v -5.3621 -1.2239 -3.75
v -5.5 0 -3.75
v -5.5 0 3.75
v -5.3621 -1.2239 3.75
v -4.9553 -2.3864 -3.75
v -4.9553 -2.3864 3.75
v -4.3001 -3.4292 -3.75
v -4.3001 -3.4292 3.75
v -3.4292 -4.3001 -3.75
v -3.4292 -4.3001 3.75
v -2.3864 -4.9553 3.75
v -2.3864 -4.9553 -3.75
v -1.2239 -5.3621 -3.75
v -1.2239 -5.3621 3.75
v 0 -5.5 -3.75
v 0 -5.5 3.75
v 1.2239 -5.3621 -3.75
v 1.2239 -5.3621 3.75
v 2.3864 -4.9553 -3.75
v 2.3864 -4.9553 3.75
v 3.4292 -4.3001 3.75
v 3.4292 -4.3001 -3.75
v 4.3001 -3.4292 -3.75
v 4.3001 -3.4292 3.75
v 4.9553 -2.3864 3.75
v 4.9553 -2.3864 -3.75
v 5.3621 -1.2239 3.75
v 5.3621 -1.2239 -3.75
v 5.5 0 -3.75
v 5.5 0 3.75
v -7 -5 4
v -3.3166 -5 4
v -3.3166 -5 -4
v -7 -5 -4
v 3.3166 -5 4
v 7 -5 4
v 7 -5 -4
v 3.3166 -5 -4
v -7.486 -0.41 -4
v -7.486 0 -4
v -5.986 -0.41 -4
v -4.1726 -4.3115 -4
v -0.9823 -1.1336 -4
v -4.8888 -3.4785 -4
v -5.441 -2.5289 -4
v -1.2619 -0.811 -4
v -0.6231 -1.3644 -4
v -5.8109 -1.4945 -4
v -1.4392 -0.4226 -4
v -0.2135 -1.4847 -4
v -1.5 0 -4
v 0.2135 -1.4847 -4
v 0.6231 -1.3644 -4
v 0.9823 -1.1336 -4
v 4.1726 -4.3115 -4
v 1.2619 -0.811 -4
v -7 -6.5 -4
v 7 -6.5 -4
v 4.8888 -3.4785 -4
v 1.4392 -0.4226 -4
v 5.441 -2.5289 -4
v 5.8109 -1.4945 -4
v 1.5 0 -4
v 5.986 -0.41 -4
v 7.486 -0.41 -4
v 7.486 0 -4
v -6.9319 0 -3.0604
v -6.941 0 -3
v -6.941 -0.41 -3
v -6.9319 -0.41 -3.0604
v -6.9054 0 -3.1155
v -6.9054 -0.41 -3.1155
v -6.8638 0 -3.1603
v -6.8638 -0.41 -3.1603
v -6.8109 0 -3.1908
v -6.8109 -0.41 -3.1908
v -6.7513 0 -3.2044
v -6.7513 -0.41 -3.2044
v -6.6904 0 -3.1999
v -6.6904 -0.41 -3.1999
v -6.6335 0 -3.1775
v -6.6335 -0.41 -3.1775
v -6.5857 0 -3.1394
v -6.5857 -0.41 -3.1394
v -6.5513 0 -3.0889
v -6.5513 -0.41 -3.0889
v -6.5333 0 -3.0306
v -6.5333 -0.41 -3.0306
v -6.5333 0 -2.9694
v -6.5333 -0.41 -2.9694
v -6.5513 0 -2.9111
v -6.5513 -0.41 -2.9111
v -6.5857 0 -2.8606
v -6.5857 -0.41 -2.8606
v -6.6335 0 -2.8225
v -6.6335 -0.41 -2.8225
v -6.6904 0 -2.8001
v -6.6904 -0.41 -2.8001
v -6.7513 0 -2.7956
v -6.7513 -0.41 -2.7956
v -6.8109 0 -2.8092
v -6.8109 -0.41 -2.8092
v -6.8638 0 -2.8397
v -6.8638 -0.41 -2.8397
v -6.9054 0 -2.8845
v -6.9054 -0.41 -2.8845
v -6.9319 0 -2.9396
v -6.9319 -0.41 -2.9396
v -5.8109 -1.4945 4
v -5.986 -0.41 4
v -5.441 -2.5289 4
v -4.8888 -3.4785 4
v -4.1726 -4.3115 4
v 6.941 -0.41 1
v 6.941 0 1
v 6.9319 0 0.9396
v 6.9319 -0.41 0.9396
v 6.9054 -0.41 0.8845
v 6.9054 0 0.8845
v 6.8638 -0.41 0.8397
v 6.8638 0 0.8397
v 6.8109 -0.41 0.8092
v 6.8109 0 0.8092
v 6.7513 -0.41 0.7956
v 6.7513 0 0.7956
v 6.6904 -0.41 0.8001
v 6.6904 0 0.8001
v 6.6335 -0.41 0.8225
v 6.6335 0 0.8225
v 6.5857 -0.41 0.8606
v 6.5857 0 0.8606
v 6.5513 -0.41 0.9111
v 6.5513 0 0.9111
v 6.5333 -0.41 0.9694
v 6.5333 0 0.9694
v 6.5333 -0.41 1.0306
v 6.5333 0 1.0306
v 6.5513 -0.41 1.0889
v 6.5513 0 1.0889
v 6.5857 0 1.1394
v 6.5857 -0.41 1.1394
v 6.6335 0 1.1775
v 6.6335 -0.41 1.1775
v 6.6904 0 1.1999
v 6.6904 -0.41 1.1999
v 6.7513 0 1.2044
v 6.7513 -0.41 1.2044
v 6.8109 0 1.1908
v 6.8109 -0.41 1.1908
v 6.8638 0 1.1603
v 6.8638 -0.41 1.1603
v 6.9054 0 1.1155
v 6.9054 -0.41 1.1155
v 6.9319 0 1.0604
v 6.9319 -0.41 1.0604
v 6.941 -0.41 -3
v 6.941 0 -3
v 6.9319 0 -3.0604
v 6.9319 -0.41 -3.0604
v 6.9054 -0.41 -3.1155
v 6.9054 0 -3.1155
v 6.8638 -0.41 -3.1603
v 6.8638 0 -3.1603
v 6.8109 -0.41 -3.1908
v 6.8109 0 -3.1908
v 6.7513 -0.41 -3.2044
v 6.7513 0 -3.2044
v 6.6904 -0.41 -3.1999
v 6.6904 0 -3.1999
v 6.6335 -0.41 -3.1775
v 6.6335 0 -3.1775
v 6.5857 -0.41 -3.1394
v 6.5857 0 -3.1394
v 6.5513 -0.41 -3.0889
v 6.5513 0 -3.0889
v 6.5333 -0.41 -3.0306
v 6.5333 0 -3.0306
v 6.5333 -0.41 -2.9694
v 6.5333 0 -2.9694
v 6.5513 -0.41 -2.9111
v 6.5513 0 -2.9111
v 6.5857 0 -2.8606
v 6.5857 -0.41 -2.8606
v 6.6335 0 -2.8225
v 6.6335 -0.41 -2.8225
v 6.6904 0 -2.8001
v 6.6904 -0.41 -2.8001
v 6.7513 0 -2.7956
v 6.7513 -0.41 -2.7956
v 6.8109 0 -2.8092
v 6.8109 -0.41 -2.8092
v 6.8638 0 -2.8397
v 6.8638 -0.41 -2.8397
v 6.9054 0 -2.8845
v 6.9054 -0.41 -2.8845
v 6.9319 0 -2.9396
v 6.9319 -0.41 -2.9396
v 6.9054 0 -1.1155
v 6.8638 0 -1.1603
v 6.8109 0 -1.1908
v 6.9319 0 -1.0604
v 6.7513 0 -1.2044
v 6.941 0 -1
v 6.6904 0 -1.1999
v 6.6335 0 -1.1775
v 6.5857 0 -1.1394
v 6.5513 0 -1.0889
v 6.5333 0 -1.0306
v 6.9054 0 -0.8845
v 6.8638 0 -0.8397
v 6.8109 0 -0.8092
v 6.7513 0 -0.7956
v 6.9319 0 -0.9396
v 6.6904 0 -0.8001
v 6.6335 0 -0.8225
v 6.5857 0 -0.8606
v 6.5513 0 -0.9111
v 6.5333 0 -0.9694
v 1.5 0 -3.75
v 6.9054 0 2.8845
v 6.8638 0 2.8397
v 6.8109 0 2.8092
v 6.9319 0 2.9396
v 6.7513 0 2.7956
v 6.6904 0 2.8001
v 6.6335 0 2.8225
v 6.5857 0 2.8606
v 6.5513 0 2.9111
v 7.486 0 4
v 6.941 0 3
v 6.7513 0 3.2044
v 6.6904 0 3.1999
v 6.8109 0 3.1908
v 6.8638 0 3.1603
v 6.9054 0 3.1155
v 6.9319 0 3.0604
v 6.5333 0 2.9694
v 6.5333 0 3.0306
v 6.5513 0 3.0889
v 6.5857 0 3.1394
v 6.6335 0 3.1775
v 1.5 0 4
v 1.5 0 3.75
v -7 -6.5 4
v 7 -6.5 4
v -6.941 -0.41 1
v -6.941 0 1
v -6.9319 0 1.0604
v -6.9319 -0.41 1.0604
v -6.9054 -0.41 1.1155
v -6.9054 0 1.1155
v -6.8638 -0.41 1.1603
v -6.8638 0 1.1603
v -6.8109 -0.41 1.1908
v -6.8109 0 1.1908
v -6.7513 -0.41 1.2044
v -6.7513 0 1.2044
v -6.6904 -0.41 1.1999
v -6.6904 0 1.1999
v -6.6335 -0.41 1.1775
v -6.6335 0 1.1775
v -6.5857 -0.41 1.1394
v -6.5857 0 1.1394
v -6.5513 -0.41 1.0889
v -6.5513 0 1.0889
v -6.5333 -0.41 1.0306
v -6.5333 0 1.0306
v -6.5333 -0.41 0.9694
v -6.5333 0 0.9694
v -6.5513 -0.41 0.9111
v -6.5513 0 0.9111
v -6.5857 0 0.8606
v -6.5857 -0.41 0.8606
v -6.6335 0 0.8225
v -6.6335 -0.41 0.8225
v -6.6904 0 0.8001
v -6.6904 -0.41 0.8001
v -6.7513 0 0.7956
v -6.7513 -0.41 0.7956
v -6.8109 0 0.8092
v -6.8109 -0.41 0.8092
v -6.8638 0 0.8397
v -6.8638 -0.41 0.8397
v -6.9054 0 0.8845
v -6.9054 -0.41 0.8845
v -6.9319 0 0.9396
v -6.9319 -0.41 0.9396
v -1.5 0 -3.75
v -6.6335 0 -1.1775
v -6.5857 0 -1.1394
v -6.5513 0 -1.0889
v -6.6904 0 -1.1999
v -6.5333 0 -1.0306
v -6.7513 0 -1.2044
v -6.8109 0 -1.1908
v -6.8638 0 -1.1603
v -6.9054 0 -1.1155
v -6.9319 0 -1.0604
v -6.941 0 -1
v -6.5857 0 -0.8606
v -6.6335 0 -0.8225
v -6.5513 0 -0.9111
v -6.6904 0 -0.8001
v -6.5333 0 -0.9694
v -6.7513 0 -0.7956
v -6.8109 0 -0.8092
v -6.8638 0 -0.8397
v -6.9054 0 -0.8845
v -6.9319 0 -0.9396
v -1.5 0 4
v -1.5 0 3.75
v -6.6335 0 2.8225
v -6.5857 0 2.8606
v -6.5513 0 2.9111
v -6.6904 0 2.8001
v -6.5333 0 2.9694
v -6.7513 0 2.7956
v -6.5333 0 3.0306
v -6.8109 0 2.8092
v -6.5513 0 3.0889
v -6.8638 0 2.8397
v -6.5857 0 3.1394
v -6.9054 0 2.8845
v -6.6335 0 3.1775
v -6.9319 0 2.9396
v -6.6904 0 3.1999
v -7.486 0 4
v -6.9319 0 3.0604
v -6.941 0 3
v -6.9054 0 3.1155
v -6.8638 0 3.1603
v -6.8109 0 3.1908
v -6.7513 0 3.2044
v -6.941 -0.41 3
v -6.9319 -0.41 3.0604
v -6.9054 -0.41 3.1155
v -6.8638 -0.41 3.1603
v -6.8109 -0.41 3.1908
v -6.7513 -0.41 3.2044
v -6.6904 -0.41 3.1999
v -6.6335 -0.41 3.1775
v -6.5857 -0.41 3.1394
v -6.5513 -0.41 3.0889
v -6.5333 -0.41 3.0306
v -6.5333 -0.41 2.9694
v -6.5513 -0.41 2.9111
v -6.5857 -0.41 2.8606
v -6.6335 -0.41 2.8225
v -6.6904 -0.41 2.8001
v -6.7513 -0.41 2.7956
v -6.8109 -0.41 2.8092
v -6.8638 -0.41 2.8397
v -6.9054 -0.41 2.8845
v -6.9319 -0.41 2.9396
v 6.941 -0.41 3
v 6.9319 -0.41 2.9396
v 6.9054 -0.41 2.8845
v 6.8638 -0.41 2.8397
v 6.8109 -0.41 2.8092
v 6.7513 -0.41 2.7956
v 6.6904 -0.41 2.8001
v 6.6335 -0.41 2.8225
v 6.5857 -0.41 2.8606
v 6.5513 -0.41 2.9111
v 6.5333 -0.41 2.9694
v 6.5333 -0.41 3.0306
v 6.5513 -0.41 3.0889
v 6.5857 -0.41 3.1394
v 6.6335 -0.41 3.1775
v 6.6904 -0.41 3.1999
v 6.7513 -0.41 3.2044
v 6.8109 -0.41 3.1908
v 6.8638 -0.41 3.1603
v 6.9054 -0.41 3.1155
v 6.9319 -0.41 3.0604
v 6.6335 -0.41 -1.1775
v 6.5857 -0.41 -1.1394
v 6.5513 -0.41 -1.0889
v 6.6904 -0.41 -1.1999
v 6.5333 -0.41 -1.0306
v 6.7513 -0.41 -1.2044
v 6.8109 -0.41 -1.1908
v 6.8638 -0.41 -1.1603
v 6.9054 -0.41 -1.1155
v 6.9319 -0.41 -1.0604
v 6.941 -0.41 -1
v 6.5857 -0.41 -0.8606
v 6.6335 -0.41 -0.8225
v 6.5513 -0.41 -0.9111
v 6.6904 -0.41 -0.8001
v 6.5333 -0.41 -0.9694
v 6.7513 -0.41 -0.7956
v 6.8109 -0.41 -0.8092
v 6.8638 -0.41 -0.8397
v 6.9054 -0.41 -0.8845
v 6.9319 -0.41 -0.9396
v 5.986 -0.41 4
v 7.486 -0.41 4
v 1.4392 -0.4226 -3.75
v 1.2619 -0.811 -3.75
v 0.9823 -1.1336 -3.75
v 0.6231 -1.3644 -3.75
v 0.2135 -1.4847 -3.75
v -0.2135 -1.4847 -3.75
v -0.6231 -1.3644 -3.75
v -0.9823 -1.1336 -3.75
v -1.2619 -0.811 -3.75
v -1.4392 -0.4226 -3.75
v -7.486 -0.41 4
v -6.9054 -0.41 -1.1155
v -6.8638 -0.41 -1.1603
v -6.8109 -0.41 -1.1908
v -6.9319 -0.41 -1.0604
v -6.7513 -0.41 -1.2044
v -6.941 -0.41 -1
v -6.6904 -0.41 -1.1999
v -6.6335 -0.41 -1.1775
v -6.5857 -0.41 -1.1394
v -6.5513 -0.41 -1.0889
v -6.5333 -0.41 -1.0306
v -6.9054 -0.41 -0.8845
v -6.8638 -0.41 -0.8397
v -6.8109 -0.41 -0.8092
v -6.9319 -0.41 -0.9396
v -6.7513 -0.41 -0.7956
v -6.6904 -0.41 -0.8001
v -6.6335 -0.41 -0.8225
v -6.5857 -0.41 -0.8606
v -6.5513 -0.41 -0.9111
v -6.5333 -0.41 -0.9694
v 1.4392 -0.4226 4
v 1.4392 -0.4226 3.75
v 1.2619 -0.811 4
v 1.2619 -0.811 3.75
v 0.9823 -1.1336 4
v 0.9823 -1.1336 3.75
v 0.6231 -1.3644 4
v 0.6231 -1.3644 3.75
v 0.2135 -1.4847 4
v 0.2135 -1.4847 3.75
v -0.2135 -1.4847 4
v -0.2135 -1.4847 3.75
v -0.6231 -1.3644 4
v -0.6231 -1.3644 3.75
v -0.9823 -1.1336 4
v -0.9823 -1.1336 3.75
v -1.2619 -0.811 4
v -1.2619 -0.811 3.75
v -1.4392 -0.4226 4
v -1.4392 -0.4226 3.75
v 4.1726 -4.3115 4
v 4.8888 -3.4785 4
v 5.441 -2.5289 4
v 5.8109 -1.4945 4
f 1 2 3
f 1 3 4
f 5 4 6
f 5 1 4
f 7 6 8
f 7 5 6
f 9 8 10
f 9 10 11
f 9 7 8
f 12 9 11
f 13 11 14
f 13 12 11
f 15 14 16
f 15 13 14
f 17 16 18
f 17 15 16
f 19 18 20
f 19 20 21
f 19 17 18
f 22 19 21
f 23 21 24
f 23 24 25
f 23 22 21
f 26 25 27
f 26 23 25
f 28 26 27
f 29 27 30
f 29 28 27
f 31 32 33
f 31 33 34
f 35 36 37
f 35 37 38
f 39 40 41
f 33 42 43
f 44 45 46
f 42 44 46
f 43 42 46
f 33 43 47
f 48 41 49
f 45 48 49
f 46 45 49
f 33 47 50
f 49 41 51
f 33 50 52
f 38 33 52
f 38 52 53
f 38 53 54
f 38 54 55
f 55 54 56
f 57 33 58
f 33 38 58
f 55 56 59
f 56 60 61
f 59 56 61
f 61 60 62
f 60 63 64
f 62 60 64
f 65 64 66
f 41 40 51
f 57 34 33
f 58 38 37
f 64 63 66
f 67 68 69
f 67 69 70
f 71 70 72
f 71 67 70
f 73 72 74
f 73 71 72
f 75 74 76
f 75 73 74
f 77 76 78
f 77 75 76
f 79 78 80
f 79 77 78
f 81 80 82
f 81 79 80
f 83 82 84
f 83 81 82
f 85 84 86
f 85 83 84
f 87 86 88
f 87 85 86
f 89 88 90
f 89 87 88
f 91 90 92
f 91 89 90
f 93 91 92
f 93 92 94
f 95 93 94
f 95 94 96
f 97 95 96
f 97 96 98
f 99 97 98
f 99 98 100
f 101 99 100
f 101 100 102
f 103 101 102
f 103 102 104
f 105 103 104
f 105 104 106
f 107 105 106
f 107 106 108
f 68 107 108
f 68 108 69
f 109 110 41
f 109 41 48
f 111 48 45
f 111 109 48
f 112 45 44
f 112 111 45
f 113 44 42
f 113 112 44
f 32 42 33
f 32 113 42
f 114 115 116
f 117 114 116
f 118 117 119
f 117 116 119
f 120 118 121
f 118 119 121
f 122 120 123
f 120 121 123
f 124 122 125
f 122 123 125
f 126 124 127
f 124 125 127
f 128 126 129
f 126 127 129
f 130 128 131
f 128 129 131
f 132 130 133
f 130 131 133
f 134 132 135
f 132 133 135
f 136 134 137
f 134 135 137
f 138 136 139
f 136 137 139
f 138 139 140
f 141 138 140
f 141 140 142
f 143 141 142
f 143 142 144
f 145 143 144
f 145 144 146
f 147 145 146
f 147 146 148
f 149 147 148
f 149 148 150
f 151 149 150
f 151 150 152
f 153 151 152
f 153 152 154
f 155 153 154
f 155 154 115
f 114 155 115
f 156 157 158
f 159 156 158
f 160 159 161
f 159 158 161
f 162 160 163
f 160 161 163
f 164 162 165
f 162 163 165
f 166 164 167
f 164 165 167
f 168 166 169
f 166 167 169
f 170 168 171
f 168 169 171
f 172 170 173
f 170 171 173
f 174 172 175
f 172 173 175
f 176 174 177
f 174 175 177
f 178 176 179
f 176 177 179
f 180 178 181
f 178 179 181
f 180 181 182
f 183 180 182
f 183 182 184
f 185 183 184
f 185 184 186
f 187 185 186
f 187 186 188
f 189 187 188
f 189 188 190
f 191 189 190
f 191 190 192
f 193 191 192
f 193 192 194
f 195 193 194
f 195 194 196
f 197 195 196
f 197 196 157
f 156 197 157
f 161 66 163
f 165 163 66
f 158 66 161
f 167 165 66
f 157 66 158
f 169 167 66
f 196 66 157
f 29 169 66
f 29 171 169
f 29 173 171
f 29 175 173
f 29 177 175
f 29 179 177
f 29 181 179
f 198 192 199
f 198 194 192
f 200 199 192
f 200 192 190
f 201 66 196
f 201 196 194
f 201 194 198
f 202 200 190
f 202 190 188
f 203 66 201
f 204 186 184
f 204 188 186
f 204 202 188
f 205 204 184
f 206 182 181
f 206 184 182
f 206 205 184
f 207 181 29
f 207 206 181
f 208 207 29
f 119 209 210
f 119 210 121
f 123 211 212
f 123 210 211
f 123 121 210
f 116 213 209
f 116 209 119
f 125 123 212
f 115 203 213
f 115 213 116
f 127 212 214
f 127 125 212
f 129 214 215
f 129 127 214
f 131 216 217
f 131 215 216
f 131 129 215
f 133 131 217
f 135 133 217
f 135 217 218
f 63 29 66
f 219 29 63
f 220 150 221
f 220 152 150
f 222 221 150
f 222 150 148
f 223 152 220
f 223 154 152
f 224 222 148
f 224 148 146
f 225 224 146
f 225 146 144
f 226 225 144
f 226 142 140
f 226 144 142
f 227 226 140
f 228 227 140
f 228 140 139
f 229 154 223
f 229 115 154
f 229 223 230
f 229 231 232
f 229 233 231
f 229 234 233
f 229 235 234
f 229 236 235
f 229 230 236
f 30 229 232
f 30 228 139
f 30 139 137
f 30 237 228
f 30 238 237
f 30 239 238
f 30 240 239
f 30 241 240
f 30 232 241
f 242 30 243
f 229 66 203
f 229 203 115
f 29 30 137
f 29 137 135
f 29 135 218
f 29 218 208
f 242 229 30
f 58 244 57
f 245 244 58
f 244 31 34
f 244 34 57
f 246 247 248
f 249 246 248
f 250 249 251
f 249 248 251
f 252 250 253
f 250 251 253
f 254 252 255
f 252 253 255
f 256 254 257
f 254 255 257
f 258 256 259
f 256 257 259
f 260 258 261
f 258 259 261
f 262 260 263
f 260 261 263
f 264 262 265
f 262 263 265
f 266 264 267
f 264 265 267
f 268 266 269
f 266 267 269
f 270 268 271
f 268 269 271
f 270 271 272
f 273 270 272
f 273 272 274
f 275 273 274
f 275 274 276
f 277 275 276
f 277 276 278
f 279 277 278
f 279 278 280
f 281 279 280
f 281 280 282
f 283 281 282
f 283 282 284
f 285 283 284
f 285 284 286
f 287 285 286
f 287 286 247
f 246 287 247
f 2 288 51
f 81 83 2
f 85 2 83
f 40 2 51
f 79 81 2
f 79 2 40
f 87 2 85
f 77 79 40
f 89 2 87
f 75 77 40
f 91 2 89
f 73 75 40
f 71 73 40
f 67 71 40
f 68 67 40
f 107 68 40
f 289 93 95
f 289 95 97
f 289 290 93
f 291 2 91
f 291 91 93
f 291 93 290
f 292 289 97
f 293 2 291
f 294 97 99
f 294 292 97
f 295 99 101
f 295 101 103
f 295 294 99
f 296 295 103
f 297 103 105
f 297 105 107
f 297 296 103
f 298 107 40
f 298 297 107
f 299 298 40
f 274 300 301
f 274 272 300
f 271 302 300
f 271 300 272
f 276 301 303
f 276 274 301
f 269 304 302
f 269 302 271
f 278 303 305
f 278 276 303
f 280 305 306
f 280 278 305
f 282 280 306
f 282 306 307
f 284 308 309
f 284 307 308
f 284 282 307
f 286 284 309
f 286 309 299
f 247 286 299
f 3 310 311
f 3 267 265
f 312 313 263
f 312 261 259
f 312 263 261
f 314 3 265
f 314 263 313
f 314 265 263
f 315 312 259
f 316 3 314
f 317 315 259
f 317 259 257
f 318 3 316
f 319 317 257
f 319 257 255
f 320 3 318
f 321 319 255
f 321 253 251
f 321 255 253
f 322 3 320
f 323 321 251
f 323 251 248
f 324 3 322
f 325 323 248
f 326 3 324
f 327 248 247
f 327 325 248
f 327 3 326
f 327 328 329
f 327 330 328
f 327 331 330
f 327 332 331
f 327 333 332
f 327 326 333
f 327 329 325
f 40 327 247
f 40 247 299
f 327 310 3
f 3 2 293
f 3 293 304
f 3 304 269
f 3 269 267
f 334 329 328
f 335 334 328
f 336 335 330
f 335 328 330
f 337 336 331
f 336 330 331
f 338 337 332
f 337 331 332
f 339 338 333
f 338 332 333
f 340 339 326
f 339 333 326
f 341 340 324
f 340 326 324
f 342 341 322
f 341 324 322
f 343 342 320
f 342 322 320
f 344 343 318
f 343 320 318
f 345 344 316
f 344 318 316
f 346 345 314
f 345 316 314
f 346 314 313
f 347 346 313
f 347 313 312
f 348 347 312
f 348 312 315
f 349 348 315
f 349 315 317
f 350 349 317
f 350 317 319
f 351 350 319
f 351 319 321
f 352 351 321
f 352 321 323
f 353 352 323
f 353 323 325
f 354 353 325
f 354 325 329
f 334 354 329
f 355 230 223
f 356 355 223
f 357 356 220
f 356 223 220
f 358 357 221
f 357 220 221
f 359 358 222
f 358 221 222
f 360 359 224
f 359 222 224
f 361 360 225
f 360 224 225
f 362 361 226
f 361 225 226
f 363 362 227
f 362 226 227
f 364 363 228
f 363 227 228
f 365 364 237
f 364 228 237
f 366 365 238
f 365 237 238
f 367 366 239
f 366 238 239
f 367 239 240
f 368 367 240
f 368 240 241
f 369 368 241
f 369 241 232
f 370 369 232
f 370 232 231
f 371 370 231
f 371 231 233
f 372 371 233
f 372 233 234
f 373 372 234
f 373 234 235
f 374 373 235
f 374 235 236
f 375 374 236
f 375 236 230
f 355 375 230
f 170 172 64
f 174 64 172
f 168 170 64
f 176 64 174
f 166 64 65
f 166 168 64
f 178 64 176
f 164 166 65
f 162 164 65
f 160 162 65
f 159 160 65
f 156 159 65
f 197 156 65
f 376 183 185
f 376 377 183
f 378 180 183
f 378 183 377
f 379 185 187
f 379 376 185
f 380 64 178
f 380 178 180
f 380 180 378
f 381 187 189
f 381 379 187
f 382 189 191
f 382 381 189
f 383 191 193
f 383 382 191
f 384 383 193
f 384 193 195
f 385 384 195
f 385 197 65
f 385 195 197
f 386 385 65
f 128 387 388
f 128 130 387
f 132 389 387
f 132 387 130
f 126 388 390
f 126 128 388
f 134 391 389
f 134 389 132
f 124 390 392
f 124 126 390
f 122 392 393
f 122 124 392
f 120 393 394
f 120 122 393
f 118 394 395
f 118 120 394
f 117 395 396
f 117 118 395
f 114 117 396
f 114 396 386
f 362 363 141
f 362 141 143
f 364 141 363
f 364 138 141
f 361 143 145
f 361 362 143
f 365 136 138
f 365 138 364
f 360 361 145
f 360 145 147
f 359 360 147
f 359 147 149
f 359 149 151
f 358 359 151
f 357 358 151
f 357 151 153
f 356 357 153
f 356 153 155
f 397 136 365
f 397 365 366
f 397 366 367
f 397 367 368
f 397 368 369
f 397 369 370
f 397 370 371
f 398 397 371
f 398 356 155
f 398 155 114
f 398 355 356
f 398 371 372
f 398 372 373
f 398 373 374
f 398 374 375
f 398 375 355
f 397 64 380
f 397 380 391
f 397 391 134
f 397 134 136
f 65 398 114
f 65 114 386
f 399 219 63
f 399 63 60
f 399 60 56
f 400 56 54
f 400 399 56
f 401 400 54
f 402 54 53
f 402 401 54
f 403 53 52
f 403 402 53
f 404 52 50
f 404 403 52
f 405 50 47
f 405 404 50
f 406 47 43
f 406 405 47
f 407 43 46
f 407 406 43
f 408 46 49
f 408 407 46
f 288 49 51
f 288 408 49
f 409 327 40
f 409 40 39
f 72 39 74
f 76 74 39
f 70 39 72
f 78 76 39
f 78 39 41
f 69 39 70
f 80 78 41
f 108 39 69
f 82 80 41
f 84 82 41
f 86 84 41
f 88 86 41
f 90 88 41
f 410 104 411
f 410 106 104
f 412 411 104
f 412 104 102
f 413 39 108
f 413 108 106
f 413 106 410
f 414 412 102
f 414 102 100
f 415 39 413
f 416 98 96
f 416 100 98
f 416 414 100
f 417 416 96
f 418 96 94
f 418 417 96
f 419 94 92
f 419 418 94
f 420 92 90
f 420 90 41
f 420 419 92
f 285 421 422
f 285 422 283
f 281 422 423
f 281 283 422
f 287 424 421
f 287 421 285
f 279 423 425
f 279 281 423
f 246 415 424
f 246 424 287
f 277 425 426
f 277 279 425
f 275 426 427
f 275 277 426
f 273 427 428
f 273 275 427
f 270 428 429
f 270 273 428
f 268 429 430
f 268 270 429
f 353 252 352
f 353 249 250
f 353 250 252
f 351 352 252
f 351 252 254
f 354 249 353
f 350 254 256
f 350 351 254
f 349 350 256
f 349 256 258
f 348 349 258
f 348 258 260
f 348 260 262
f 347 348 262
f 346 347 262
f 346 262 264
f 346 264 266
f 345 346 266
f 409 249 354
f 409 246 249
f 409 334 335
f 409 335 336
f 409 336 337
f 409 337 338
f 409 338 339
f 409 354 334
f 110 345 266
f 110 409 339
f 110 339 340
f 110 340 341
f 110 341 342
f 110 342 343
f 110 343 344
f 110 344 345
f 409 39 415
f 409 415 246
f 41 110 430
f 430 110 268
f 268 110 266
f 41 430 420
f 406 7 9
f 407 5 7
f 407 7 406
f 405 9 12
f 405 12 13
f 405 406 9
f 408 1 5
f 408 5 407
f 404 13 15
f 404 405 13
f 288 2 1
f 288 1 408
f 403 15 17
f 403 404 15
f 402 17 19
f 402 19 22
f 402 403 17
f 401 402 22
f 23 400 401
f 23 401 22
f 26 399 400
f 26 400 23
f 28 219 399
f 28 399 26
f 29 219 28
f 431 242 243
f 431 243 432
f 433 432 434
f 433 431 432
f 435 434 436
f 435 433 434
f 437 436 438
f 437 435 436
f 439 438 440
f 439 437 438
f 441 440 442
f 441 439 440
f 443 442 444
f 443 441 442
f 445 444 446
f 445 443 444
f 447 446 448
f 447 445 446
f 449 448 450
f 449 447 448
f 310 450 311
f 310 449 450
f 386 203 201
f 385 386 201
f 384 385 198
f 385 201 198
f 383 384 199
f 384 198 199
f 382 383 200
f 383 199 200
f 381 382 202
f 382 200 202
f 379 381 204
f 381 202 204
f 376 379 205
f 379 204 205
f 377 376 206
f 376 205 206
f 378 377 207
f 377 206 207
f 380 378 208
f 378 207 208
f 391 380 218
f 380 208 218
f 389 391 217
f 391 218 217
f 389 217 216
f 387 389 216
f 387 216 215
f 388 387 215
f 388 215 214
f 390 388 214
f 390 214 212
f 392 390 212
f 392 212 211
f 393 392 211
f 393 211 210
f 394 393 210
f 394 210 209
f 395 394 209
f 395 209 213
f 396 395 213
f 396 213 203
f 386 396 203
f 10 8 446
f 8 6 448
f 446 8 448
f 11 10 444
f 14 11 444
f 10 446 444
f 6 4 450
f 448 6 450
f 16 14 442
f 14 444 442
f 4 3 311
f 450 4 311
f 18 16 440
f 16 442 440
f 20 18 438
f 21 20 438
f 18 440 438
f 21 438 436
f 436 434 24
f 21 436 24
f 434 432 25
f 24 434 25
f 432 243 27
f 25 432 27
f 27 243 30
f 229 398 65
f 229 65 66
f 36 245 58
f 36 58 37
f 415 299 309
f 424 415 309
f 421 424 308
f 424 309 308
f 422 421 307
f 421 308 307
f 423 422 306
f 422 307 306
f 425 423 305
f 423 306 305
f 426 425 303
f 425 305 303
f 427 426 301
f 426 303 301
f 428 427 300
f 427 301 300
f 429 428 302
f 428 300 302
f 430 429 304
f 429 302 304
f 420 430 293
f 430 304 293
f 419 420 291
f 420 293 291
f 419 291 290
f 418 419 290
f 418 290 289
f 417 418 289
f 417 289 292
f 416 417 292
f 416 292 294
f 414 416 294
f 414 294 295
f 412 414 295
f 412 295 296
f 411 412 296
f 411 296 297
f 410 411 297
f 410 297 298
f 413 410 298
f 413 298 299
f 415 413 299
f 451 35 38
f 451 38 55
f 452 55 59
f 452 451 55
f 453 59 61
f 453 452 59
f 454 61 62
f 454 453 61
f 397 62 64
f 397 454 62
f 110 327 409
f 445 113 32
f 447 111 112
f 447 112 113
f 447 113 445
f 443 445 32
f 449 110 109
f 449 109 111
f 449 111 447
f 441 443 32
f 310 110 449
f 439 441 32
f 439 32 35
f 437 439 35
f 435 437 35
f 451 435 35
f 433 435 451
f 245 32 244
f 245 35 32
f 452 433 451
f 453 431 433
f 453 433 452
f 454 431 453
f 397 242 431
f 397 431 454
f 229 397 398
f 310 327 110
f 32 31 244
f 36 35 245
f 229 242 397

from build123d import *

# Parameters (mm, degrees)
BOSS_EXTRUDE1_DEPTH        = 4
CUT_EXTRUDE1_DEPTH         = 3.75
CUT_EXTRUDE1_DEPTH_BACK    = 3.75
SKETCH2_R                  = 5.5
F_1_0MM_DOWEL_HOLE1_REACH  = 12.691
F_1_0MM_DOWEL_HOLE1_BORE_R = 0.205
LPATTERN1_COUNT            = 4
LPATTERN1_PITCH            = 2
MIRROR1_COPY_1_REACH       = 12.691
MIRROR1_COPY_1_SKETCH_R    = 0.205
MIRROR1_COPY_2_REACH       = 12.691
MIRROR1_COPY_2_SKETCH_R    = 0.205
MIRROR1_COPY_3_REACH       = 12.691
MIRROR1_COPY_3_SKETCH_R    = 0.205


with BuildPart() as part:
    # Sketch1 → Boss-Extrude1 (new, symmetric)
    with BuildSketch(Plane.XY):
        with BuildLine():
            Line((-1.5, 0), (-7.485975276, 0))
            Line((-7.485975276, 0), (-7.485975276, -0.41))
            Line((-7.485975276, -0.41), (-5.985975276, -0.41))
            ThreePointArc((-5.985975276, -0.41), (-5.186676874, -3.016352599), (-3.31662479, -5))
            Line((-3.31662479, -5), (-7, -5))
            Line((-7, -5), (-7, -6.5))
            Line((-7, -6.5), (7, -6.5))
            Line((7, -6.5), (7, -5))
            Line((7, -5), (3.31662479, -5))
            ThreePointArc((3.31662479, -5), (5.186676874, -3.016352599), (5.985975276, -0.41))
            Line((5.985975276, -0.41), (7.485975276, -0.41))
            Line((7.485975276, -0.41), (7.485975276, 0))
            Line((7.485975276, 0), (1.5, 0))
            ThreePointArc((1.5, 0), (0, -1.5), (-1.5, 0))
        make_face()
    extrude(amount=BOSS_EXTRUDE1_DEPTH, both=True)

    # Sketch2 → Cut-Extrude1 (cut, two sides: drawn at the far end of the back side and taken through both)
    with BuildSketch(Plane.XY.offset(-CUT_EXTRUDE1_DEPTH_BACK)):
        Circle(SKETCH2_R)
    extrude(amount=CUT_EXTRUDE1_DEPTH + CUT_EXTRUDE1_DEPTH_BACK, mode=Mode.SUBTRACT)

    # Ø1.0mm Dowel Hole1 bore → Ø1.0mm Dowel Hole1 (cut, up to next)
    with BuildSketch(Plane(origin=(0, 0, 0), x_dir=(1, 0, 0), z_dir=(0, 1, 0)), mode=Mode.PRIVATE) as f_1_0mm_dowel_hole1_sk1:
        with Locations((6.735975276, 3)):
            Circle(F_1_0MM_DOWEL_HOLE1_BORE_R)
    f_1_0mm_dowel_hole1_tool1 = extrude(f_1_0mm_dowel_hole1_sk1.sketch, amount=-F_1_0MM_DOWEL_HOLE1_REACH, mode=Mode.PRIVATE) & part.part
    f_1_0mm_dowel_hole1 = f_1_0mm_dowel_hole1_tool1.solids().sort_by_distance((6.735975, 0, -3))[0]
    add(f_1_0mm_dowel_hole1, mode=Mode.SUBTRACT)

    # LPattern1: Ø1.0mm Dowel Hole1 ×4
    with Locations(*[(0, 0, i * LPATTERN1_PITCH) for i in range(1, LPATTERN1_COUNT)]):
        add(f_1_0mm_dowel_hole1, mode=Mode.SUBTRACT)

    # Mirror1: Ø1.0mm Dowel Hole1 across plane
    add(f_1_0mm_dowel_hole1.mirror(Plane(origin=(0, 0, 0), x_dir=(0, 0, 1), z_dir=(1, 0, 0))), mode=Mode.SUBTRACT)

    # Mirror1 copy 1 sketch → Mirror1 copy 1 (cut, up to next)
    with BuildSketch(Plane(origin=(0, 0, 2), x_dir=(-1, 0, 0), z_dir=(0, 1, 0)), mode=Mode.PRIVATE) as mirror1_copy_1_sk1:
        with Locations((6.735975276, -3)):
            Circle(MIRROR1_COPY_1_SKETCH_R)
    mirror1_copy_1_tool1 = extrude(mirror1_copy_1_sk1.sketch, amount=-MIRROR1_COPY_1_REACH, mode=Mode.PRIVATE) & part.part
    add(mirror1_copy_1_tool1.solids().sort_by_distance((-6.735975, 0, -1))[0], mode=Mode.SUBTRACT)

    # Mirror1 copy 2 sketch → Mirror1 copy 2 (cut, up to next)
    with BuildSketch(Plane(origin=(0, 0, 4), x_dir=(-1, 0, 0), z_dir=(0, 1, 0)), mode=Mode.PRIVATE) as mirror1_copy_2_sk1:
        with Locations((6.735975276, -3)):
            Circle(MIRROR1_COPY_2_SKETCH_R)
    mirror1_copy_2_tool1 = extrude(mirror1_copy_2_sk1.sketch, amount=-MIRROR1_COPY_2_REACH, mode=Mode.PRIVATE) & part.part
    add(mirror1_copy_2_tool1.solids().sort_by_distance((-6.735975, 0, 1))[0], mode=Mode.SUBTRACT)

    # Mirror1 copy 3 sketch → Mirror1 copy 3 (cut, up to next)
    with BuildSketch(Plane(origin=(0, 0, 6), x_dir=(-1, 0, 0), z_dir=(0, 1, 0)), mode=Mode.PRIVATE) as mirror1_copy_3_sk1:
        with Locations((6.735975276, -3)):
            Circle(MIRROR1_COPY_3_SKETCH_R)
    mirror1_copy_3_tool1 = extrude(mirror1_copy_3_sk1.sketch, amount=-MIRROR1_COPY_3_REACH, mode=Mode.PRIVATE) & part.part
    add(mirror1_copy_3_tool1.solids().sort_by_distance((-6.735975, 0, 3))[0], mode=Mode.SUBTRACT)


solid = part.part
